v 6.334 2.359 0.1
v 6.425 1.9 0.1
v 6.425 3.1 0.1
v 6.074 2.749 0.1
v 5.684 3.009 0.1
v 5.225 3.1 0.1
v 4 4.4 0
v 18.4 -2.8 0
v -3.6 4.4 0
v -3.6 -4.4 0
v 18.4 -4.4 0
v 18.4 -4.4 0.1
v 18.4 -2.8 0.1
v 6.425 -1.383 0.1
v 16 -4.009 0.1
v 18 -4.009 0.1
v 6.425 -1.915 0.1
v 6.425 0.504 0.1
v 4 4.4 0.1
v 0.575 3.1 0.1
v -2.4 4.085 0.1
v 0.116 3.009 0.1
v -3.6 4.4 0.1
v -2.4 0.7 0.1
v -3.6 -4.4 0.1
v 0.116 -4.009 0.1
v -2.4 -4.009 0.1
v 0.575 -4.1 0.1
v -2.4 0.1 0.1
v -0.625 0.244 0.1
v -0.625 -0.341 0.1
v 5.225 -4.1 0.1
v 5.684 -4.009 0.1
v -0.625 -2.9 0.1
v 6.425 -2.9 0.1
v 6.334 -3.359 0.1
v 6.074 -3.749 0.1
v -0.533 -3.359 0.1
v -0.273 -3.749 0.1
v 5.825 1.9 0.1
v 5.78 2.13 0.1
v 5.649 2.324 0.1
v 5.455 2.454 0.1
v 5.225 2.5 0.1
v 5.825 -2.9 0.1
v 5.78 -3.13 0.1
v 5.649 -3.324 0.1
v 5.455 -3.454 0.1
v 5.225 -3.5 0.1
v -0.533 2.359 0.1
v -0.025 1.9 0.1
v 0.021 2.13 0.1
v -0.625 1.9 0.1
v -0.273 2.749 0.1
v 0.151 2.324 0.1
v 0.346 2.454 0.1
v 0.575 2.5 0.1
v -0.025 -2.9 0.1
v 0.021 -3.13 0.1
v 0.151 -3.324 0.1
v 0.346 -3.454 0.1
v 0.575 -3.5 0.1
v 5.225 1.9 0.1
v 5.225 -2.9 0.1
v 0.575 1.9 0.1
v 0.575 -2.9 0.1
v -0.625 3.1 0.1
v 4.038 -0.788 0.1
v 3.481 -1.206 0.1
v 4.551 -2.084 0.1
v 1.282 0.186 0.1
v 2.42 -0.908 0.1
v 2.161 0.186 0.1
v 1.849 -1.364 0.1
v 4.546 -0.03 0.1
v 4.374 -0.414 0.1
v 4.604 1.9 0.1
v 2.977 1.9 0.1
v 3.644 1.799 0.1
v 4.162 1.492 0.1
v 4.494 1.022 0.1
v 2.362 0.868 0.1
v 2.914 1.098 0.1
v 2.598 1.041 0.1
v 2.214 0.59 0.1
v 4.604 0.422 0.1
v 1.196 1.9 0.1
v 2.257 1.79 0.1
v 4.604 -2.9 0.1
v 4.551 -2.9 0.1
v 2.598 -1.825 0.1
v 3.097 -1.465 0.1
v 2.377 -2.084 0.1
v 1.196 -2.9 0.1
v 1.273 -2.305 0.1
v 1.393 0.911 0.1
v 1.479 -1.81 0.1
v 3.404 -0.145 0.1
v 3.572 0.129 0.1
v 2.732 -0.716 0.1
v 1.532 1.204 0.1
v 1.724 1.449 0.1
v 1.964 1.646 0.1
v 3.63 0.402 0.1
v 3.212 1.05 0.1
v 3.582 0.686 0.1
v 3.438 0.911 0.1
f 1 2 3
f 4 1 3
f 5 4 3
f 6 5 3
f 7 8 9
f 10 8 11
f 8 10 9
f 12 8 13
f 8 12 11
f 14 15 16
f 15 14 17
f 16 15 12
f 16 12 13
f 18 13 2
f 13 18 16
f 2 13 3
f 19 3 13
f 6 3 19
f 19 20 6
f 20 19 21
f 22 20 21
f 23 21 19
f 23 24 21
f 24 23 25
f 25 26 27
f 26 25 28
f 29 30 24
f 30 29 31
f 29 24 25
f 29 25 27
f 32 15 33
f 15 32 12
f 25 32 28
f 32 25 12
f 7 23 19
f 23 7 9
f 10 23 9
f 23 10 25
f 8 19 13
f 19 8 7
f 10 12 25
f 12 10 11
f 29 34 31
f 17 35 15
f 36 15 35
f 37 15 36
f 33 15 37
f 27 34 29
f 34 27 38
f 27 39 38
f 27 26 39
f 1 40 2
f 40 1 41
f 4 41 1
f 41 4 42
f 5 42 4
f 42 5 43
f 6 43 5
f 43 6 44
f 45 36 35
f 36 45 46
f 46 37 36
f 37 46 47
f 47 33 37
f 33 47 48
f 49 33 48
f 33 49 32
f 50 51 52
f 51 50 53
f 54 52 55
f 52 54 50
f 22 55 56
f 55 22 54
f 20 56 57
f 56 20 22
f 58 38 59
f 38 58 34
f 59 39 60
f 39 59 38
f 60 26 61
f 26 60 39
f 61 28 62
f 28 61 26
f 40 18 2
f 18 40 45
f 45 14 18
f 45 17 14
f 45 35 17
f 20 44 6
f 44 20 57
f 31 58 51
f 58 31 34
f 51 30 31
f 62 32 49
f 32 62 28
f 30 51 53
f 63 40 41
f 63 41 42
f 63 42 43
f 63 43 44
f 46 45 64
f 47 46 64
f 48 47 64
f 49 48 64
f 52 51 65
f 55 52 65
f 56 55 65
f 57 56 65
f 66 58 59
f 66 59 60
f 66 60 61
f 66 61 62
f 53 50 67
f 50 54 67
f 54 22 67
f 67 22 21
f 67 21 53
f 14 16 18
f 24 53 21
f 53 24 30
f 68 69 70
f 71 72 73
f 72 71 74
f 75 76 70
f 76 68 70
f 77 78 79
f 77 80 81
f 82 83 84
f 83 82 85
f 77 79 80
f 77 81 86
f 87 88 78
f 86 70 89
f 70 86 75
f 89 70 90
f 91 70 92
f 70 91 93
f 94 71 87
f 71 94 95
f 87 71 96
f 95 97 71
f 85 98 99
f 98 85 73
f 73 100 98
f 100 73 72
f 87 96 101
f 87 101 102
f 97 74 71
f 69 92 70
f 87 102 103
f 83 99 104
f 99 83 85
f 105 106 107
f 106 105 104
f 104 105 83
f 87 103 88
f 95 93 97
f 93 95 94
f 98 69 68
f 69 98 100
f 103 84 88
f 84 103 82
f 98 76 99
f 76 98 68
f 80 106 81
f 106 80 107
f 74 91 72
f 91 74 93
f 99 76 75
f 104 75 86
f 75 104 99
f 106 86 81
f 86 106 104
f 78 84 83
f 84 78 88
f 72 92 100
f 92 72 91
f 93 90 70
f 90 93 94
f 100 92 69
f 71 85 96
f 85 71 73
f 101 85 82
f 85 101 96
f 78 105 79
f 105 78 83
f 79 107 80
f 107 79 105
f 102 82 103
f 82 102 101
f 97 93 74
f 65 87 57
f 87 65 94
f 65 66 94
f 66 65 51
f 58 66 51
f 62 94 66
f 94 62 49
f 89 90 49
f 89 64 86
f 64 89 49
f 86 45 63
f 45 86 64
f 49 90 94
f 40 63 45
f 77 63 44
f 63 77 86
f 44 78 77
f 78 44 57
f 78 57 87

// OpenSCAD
// file: ../p/1-4ndis.scad
use <../lib.scad>
function ldraw_lib__1_4ndis() = [
// 0 Disc Negative 0.25
// 0 Name: 1-4ndis.dat
// 0 Author: James Jessiman
// 0 !LDRAW_ORG Primitive UPDATE 2012-01
// 0 !LICENSE Licensed under CC BY 2.0 and CC BY 4.0 : see CAreadme.txt
// 
// 0 BFC CERTIFY CCW
  [0,"BFC","CERTIFY"],
  [0,"BFC","CCW"],
// 
// 0 !HISTORY 2002-03-23 [sbliss] Added BFC Statement
// 0 !HISTORY 2002-04-25 [PTadmin] Official Update 2002-02
// 0 !HISTORY 2007-06-22 [PTadmin] Header formatted for Contributor Agreement
// 0 !HISTORY 2008-07-01 [PTadmin] Official Update 2008-01
// 0 !HISTORY 2012-02-16 [Philo] Changed to CCW
// 0 !HISTORY 2012-03-30 [PTadmin] Official Update 2012-01
// 
// 
// 3 16 0.9239 0 0.3827 1 0 0 1 0 1
  [3,16,0.9239,0,0.3827,1,0,0,1,0,1],
// 3 16 0.7071 0 0.7071 0.9239 0 0.3827 1 0 1
  [3,16,0.7071,0,0.7071,0.9239,0,0.3827,1,0,1],
// 3 16 0.3827 0 0.9239 0.7071 0 0.7071 1 0 1
  [3,16,0.3827,0,0.9239,0.7071,0,0.7071,1,0,1],
// 3 16 0 0 1 0.3827 0 0.9239 1 0 1
  [3,16,0,0,1,0.3827,0,0.9239,1,0,1],
];
module ldraw_lib__1_4ndis(step=0, col=false, unit=2/5, alt=false, line=0.2, solid=!$preview)
    makepoly(ldraw_lib__1_4ndis(), step=step, col=col, unit=unit, alt=alt, line=line, solid=solid);
ldraw_lib__1_4ndis(line=0.2);
// file: ../p/3-16ndis.scad
use <../lib.scad>
function ldraw_lib__3_16ndis() = [
// 0 Disc Negative 0.1875
// 0 Name: 3-16ndis.dat
// 0 Author: Guy Vivan [guyvivan]
// 0 !LDRAW_ORG Primitive UPDATE 2009-01
// 0 !LICENSE Licensed under CC BY 2.0 and CC BY 4.0 : see CAreadme.txt
// 
// 0 BFC CERTIFY CCW
  [0,"BFC","CERTIFY"],
  [0,"BFC","CCW"],
// 
// 0 !HISTORY 2009-05-02 [PTadmin] Official Update 2009-01
// 
// 
// 3 16 1 0 1 0.9239 0 0.3827 1 0 0
  [3,16,1,0,1,0.9239,0,0.3827,1,0,0],
// 3 16 1 0 1 0.7071 0 0.7071 0.9239 0 0.3827
  [3,16,1,0,1,0.7071,0,0.7071,0.9239,0,0.3827],
// 3 16 1 0 1 0.3827 0 0.9239 0.7071 0 0.7071
  [3,16,1,0,1,0.3827,0,0.9239,0.7071,0,0.7071],
// 
// 0 end of file
// 
];
module ldraw_lib__3_16ndis(step=0, col=false, unit=2/5, alt=false, line=0.2, solid=!$preview)
    makepoly(ldraw_lib__3_16ndis(), step=step, col=col, unit=unit, alt=alt, line=line, solid=solid);
ldraw_lib__3_16ndis(line=0.2);
// file: ../p/1-4ring1.scad
use <../lib.scad>
function ldraw_lib__1_4ring1() = [
// 0 Ring  1 x 0.25
// 0 Name: 1-4ring1.dat
// 0 Author: Chris Dee [cwdee]
// 0 !LDRAW_ORG Primitive UPDATE 2012-01
// 0 !LICENSE Licensed under CC BY 2.0 and CC BY 4.0 : see CAreadme.txt
// 
// 0 BFC CERTIFY CCW
  [0,"BFC","CERTIFY"],
  [0,"BFC","CCW"],
// 
// 0 !HISTORY 2000-05-07 [PTadmin] Official Update 2000-01
// 0 !HISTORY 2002-11-22 [hafhead] Added BFC statement
// 0 !HISTORY 2002-11-30 [PTadmin] Official Update 2002-05
// 0 !HISTORY 2007-06-22 [PTadmin] Header formatted for Contributor Agreement
// 0 !HISTORY 2008-07-01 [PTadmin] Official Update 2008-01
// 0 !HISTORY 2012-02-16 [Philo] Changed to CCW
// 0 !HISTORY 2012-03-30 [PTadmin] Official Update 2012-01
// 
// 
// 4 16 2 0 0 1.8478 0 0.7654 0.9239 0 0.3827 1 0 0
  [4,16,2,0,0,1.8478,0,0.7654,0.9239,0,0.3827,1,0,0],
// 4 16 1.8478 0 0.7654 1.4142 0 1.4142 0.7071 0 0.7071 0.9239 0 0.3827
  [4,16,1.8478,0,0.7654,1.4142,0,1.4142,0.7071,0,0.7071,0.9239,0,0.3827],
// 4 16 1.4142 0 1.4142 0.7654 0 1.8478 0.3827 0 0.9239 0.7071 0 0.7071
  [4,16,1.4142,0,1.4142,0.7654,0,1.8478,0.3827,0,0.9239,0.7071,0,0.7071],
// 4 16 0.7654 0 1.8478 0 0 2 0 0 1 0.3827 0 0.9239
  [4,16,0.7654,0,1.8478,0,0,2,0,0,1,0.3827,0,0.9239],
];
module ldraw_lib__1_4ring1(step=0, col=false, unit=2/5, alt=false, line=0.2, solid=!$preview)
    makepoly(ldraw_lib__1_4ring1(), step=step, col=col, unit=unit, alt=alt, line=line, solid=solid);
ldraw_lib__1_4ring1(line=0.2);
// file: ../p/1-4disc.scad
use <../lib.scad>
function ldraw_lib__1_4disc() = [
// 0 Disc 0.25
// 0 Name: 1-4disc.dat
// 0 Author: James Jessiman
// 0 !LDRAW_ORG Primitive UPDATE 2002-02
// 0 !LICENSE Licensed under CC BY 2.0 and CC BY 4.0 : see CAreadme.txt
// 
// 0 BFC CERTIFY CCW
  [0,"BFC","CERTIFY"],
  [0,"BFC","CCW"],
// 
// 0 !HISTORY 2002-03-23 [sbliss] Added BFC statement.
// 0 !HISTORY 2002-04-25 [PTadmin] Official Update 2002-02
// 0 !HISTORY 2007-06-22 [PTadmin] Header formatted for Contributor Agreement
// 0 !HISTORY 2008-07-01 [PTadmin] Official Update 2008-01
// 
// 
// 3 16 0 0 0 1 0 0 0.9239 0 0.3827
  [3,16,0,0,0,1,0,0,0.9239,0,0.3827],
// 3 16 0 0 0 0.9239 0 0.3827 0.7071 0 0.7071
  [3,16,0,0,0,0.9239,0,0.3827,0.7071,0,0.7071],
// 3 16 0 0 0 0.7071 0 0.7071 0.3827 0 0.9239
  [3,16,0,0,0,0.7071,0,0.7071,0.3827,0,0.9239],
// 3 16 0 0 0 0.3827 0 0.9239 0 0 1
  [3,16,0,0,0,0.3827,0,0.9239,0,0,1],
// 0
];
module ldraw_lib__1_4disc(step=0, col=false, unit=2/5, alt=false, line=0.2, solid=!$preview)
    makepoly(ldraw_lib__1_4disc(), step=step, col=col, unit=unit, alt=alt, line=line, solid=solid);
ldraw_lib__1_4disc(line=0.2);
// file: ../p/type-swiss721bt-bold-n2.scad
use <../lib.scad>
function ldraw_lib__type_swiss721bt_bold_n2() = [
// 0 Type Swiss721BT Number "2" Bold
// 0 Name: type-swiss721bt-bold-n2.dat
// 0 Author: Ulrich Röder [UR]
// 0 !LDRAW_ORG Primitive UPDATE 2019-01
// 0 !LICENSE Licensed under CC BY 2.0 and CC BY 4.0 : see CAreadme.txt
// 
// 0 BFC CERTIFY CCW
  [0,"BFC","CERTIFY"],
  [0,"BFC","CCW"],
// 
// 0 !HISTORY 2019-06-28 [PTadmin] Official Update 2019-01
// 
// 
// 0 // Main
// 3 16 .237 0 -.06 .121 0 -.147 .344 0 -.33
  [3,16,.237,0,-.06,.121,0,-.147,.344,0,-.33],
// 4 16 -.154 0 .143 -.337 0 .143 -.219 0 -.18 -.1 0 -.085
  [4,16,-.154,0,.143,-.337,0,.143,-.219,0,-.18,-.1,0,-.085],
// 3 16 .343 0 .098 .307 0 .018 .344 0 -.33
  [3,16,.343,0,.098,.307,0,.018,.344,0,-.33],
// 3 16 .307 0 .018 .237 0 -.06 .344 0 -.33
  [3,16,.307,0,.018,.237,0,-.06,.344,0,-.33],
// 3 16 .355 0 .5 .016 0 .5 .155 0 .479
  [3,16,.355,0,.5,.016,0,.5,.155,0,.479],
// 3 16 .355 0 .5 .263 0 .415 .332 0 .317
  [3,16,.355,0,.5,.263,0,.415,.332,0,.317],
// 4 16 -.112 0 .285 -.143 0 .227 .003 0 .333 -.063 0 .321
  [4,16,-.112,0,.285,-.143,0,.227,.003,0,.333,-.063,0,.321],
// 3 16 .355 0 .5 .155 0 .479 .263 0 .415
  [3,16,.355,0,.5,.155,0,.479,.263,0,.415],
// 3 16 .355 0 .5 .332 0 .317 .355 0 .192
  [3,16,.355,0,.5,.332,0,.317,.355,0,.192],
// 3 16 -.355 0 .5 -.134 0 .477 .016 0 .5
  [3,16,-.355,0,.5,-.134,0,.477,.016,0,.5],
// 4 16 .355 0 -.5 .355 0 .192 .343 0 .098 .344 0 -.33
  [4,16,.355,0,-.5,.355,0,.192,.343,0,.098,.344,0,-.33],
// 3 16 .355 0 -.5 .344 0 -.33 .344 0 -.5
  [3,16,.355,0,-.5,.344,0,-.33,.344,0,-.5],
// 4 16 -.109 0 -.33 .344 0 -.33 .041 0 -.201 -.063 0 -.276
  [4,16,-.109,0,-.33,.344,0,-.33,.041,0,-.201,-.063,0,-.276],
// 4 16 -.339 0 -.376 -.337 0 .143 -.355 0 .5 -.355 0 -.5
  [4,16,-.339,0,-.376,-.337,0,.143,-.355,0,.5,-.355,0,-.5],
// 3 16 -.355 0 .5 -.337 0 .143 -.314 0 .294
  [3,16,-.355,0,.5,-.337,0,.143,-.314,0,.294],
// 3 16 -.339 0 -.376 -.296 0 -.273 -.337 0 .143
  [3,16,-.339,0,-.376,-.296,0,-.273,-.337,0,.143],
// 4 16 .14 0 .131 -.143 0 .227 -.154 0 .143 .105 0 .074
  [4,16,.14,0,.131,-.143,0,.227,-.154,0,.143,.105,0,.074],
// 4 16 -.1 0 -.085 -.035 0 -.045 .105 0 .074 -.154 0 .143
  [4,16,-.1,0,-.085,-.035,0,-.045,.105,0,.074,-.154,0,.143],
// 3 16 -.355 0 .5 -.314 0 .294 -.285 0 .355
  [3,16,-.355,0,.5,-.314,0,.294,-.285,0,.355],
// 3 16 -.355 0 .5 -.285 0 .355 -.245 0 .406
  [3,16,-.355,0,.5,-.285,0,.355,-.245,0,.406],
// 3 16 -.296 0 -.273 -.219 0 -.18 -.337 0 .143
  [3,16,-.296,0,-.273,-.219,0,-.18,-.337,0,.143],
// 3 16 .121 0 -.147 .041 0 -.201 .344 0 -.33
  [3,16,.121,0,-.147,.041,0,-.201,.344,0,-.33],
// 3 16 -.355 0 .5 -.245 0 .406 -.195 0 .447
  [3,16,-.355,0,.5,-.245,0,.406,-.195,0,.447],
// 4 16 .152 0 .188 .003 0 .333 -.143 0 .227 .14 0 .131
  [4,16,.152,0,.188,.003,0,.333,-.143,0,.227,.14,0,.131],
// 4 16 .112 0 .294 .065 0 .323 .152 0 .188 .142 0 .247
  [4,16,.112,0,.294,.065,0,.323,.152,0,.188,.142,0,.247],
// 3 16 .152 0 .188 .065 0 .323 .003 0 .333
  [3,16,.152,0,.188,.065,0,.323,.003,0,.333],
// 3 16 -.355 0 .5 -.195 0 .447 -.134 0 .477
  [3,16,-.355,0,.5,-.195,0,.447,-.134,0,.477],
// 
// 0 // Black
// 4 0 -.296 0 -.273 -.339 0 -.376 -.355 0 -.5 -.109 0 -.33
  [4,0,-.296,0,-.273,-.339,0,-.376,-.355,0,-.5,-.109,0,-.33],
// 4 0 -.035 0 -.045 .121 0 -.147 .237 0 -.06 .105 0 .074
  [4,0,-.035,0,-.045,.121,0,-.147,.237,0,-.06,.105,0,.074],
// 4 0 -.134 0 .477 -.195 0 .447 -.112 0 .285 -.063 0 .321
  [4,0,-.134,0,.477,-.195,0,.447,-.112,0,.285,-.063,0,.321],
// 4 0 .237 0 -.06 .307 0 .018 .14 0 .131 .105 0 .074
  [4,0,.237,0,-.06,.307,0,.018,.14,0,.131,.105,0,.074],
// 4 0 .112 0 .294 .142 0 .247 .332 0 .317 .263 0 .415
  [4,0,.112,0,.294,.142,0,.247,.332,0,.317,.263,0,.415],
// 4 0 -.1 0 -.085 -.219 0 -.18 -.109 0 -.33 -.063 0 -.276
  [4,0,-.1,0,-.085,-.219,0,-.18,-.109,0,-.33,-.063,0,-.276],
// 3 0 .14 0 .131 .307 0 .018 .343 0 .098
  [3,0,.14,0,.131,.307,0,.018,.343,0,.098],
// 4 0 .14 0 .131 .343 0 .098 .355 0 .192 .152 0 .188
  [4,0,.14,0,.131,.343,0,.098,.355,0,.192,.152,0,.188],
// 4 0 .152 0 .188 .355 0 .192 .332 0 .317 .142 0 .247
  [4,0,.152,0,.188,.355,0,.192,.332,0,.317,.142,0,.247],
// 4 0 .003 0 .333 .016 0 .5 -.134 0 .477 -.063 0 .321
  [4,0,.003,0,.333,.016,0,.5,-.134,0,.477,-.063,0,.321],
// 4 0 -.035 0 -.045 -.1 0 -.085 -.063 0 -.276 .041 0 -.201
  [4,0,-.035,0,-.045,-.1,0,-.085,-.063,0,-.276,.041,0,-.201],
// 4 0 -.109 0 -.33 -.355 0 -.5 .344 0 -.5 .344 0 -.33
  [4,0,-.109,0,-.33,-.355,0,-.5,.344,0,-.5,.344,0,-.33],
// 3 0 -.035 0 -.045 .041 0 -.201 .121 0 -.147
  [3,0,-.035,0,-.045,.041,0,-.201,.121,0,-.147],
// 4 0 -.314 0 .294 -.337 0 .143 -.154 0 .143 -.143 0 .227
  [4,0,-.314,0,.294,-.337,0,.143,-.154,0,.143,-.143,0,.227],
// 4 0 -.112 0 .285 -.285 0 .355 -.314 0 .294 -.143 0 .227
  [4,0,-.112,0,.285,-.285,0,.355,-.314,0,.294,-.143,0,.227],
// 4 0 .003 0 .333 .065 0 .323 .155 0 .479 .016 0 .5
  [4,0,.003,0,.333,.065,0,.323,.155,0,.479,.016,0,.5],
// 4 0 .263 0 .415 .155 0 .479 .065 0 .323 .112 0 .294
  [4,0,.263,0,.415,.155,0,.479,.065,0,.323,.112,0,.294],
// 4 0 -.285 0 .355 -.112 0 .285 -.195 0 .447 -.245 0 .406
  [4,0,-.285,0,.355,-.112,0,.285,-.195,0,.447,-.245,0,.406],
// 3 0 -.296 0 -.273 -.109 0 -.33 -.219 0 -.18
  [3,0,-.296,0,-.273,-.109,0,-.33,-.219,0,-.18],
];
module ldraw_lib__type_swiss721bt_bold_n2(step=0, col=false, unit=2/5, alt=false, line=0.2, solid=!$preview)
    makepoly(ldraw_lib__type_swiss721bt_bold_n2(), step=step, col=col, unit=unit, alt=alt, line=line, solid=solid);
ldraw_lib__type_swiss721bt_bold_n2(line=0.2);
// file: s/821435as03.scad
use <../../lib.scad>
use <../../p/1-4ndis.scad>
function ldraw_lib__s__821435as03() = [
// 0 ~Sticker Sloped Body for Racing Number
// 0 Name: s\821435as03.dat
// 0 Author: Ulrich Röder [UR]
// 0 !LDRAW_ORG Subpart UPDATE 2019-01
// 0 !LICENSE Licensed under CC BY 2.0 and CC BY 4.0 : see CAreadme.txt
// 
// 0 BFC CERTIFY CCW
  [0,"BFC","CERTIFY"],
  [0,"BFC","CCW"],
// 
// 0 !HISTORY 2019-06-28 [PTadmin] Official Update 2019-01
// 
// 
// 0 // Main
// 1 16 13.063 -.25 4.75 3 0 0 0 1 0 0 0 3 1-4ndis.dat
  [1,16,13.063,-.25,4.75,3,0,0,0,1,0,0,0,3, ldraw_lib__1_4ndis()],
// 3 16 10 0 11 46 0 -7 -9 0 11
  [3,16,10,0,11,46,0,-7,-9,0,11],
// 4 16 -9 0 -11 -9 0 11 46 0 -7 46 0 -11
  [4,16,-9,0,-11,-9,0,11,46,0,-7,46,0,-11],
// 4 16 46 -.25 -11 46 0 -11 46 0 -7 46 -.25 -7
  [4,16,46,-.25,-11,46,0,-11,46,0,-7,46,-.25,-7],
// 4 16 16.063 -.25 -4.788 40 -.25 -10.022 45 -.25 -10.022 16.063 -.25 -3.458
  [4,16,16.063,-.25,-4.788,40,-.25,-10.022,45,-.25,-10.022,16.063,-.25,-3.458],
// 3 16 45 -.25 -10.022 40 -.25 -10.022 46 -.25 -11
  [3,16,45,-.25,-10.022,40,-.25,-10.022,46,-.25,-11],
// 3 16 45 -.25 -10.022 46 -.25 -11 46 -.25 -7
  [3,16,45,-.25,-10.022,46,-.25,-11,46,-.25,-7],
// 4 16 16.063 -.25 4.75 16.063 -.25 1.261 45 -.25 -10.022 46 -.25 -7
  [4,16,16.063,-.25,4.75,16.063,-.25,1.261,45,-.25,-10.022,46,-.25,-7],
// 3 16 16.063 -.25 4.75 46 -.25 -7 16.063 -.25 7.75
  [3,16,16.063,-.25,4.75,46,-.25,-7,16.063,-.25,7.75],
// 3 16 10 -.25 11 16.063 -.25 7.75 46 -.25 -7
  [3,16,10,-.25,11,16.063,-.25,7.75,46,-.25,-7],
// 3 16 13.063 -.25 7.75 16.063 -.25 7.75 10 -.25 11
  [3,16,13.063,-.25,7.75,16.063,-.25,7.75,10,-.25,11],
// 4 16 -6 -.25 10.213 1.438 -.25 7.75 13.063 -.25 7.75 10 -.25 11
  [4,16,-6,-.25,10.213,1.438,-.25,7.75,13.063,-.25,7.75,10,-.25,11],
// 3 16 .2899 -.25 7.5217 1.438 -.25 7.75 -6 -.25 10.213
  [3,16,.2899,-.25,7.5217,1.438,-.25,7.75,-6,-.25,10.213],
// 3 16 -9 -.25 11 -6 -.25 10.213 10 -.25 11
  [3,16,-9,-.25,11,-6,-.25,10.213,10,-.25,11],
// 4 16 -9 -.25 -11 -6 -.25 1.75 -6 -.25 10.213 -9 -.25 11
  [4,16,-9,-.25,-11,-6,-.25,1.75,-6,-.25,10.213,-9,-.25,11],
// 4 16 1.438 -.25 -10.25 .2899 -.25 -10.0217 -6 -.25 -10.022 -9 -.25 -11
  [4,16,1.438,-.25,-10.25,.2899,-.25,-10.0217,-6,-.25,-10.022,-9,-.25,-11],
// 4 16 -1.563 -.25 .61 -6 -.25 1.75 -6 -.25 .25 -1.563 -.25 -.853
  [4,16,-1.563,-.25,.61,-6,-.25,1.75,-6,-.25,.25,-1.563,-.25,-.853],
// 3 16 -6 -.25 .25 -6 -.25 1.75 -9 -.25 -11
  [3,16,-6,-.25,.25,-6,-.25,1.75,-9,-.25,-11],
// 3 16 -6 -.25 .25 -9 -.25 -11 -6 -.25 -10.022
  [3,16,-6,-.25,.25,-9,-.25,-11,-6,-.25,-10.022],
// 4 16 40 -.25 -10.022 14.2111 -.25 -10.0217 13.063 -.25 -10.25 46 -.25 -11
  [4,16,40,-.25,-10.022,14.2111,-.25,-10.0217,13.063,-.25,-10.25,46,-.25,-11],
// 4 16 1.438 -.25 -10.25 -9 -.25 -11 46 -.25 -11 13.063 -.25 -10.25
  [4,16,1.438,-.25,-10.25,-9,-.25,-11,46,-.25,-11,13.063,-.25,-10.25],
// 4 16 -9 -.25 11 10 -.25 11 10 0 11 -9 0 11
  [4,16,-9,-.25,11,10,-.25,11,10,0,11,-9,0,11],
// 4 16 -9 0 11 -9 0 -11 -9 -.25 -11 -9 -.25 11
  [4,16,-9,0,11,-9,0,-11,-9,-.25,-11,-9,-.25,11],
// 4 16 10 -.25 11 46 -.25 -7 46 0 -7 10 0 11
  [4,16,10,-.25,11,46,-.25,-7,46,0,-7,10,0,11],
// 4 16 46 0 -11 46 -.25 -11 -9 -.25 -11 -9 0 -11
  [4,16,46,0,-11,46,-.25,-11,-9,-.25,-11,-9,0,-11],
];
module ldraw_lib__s__821435as03(step=0, col=false, unit=2/5, alt=false, line=0.2, solid=!$preview)
    makepoly(ldraw_lib__s__821435as03(), step=step, col=col, unit=unit, alt=alt, line=line, solid=solid);
ldraw_lib__s__821435as03(line=0.2);
// file: s/821435as02.scad
use <../../lib.scad>
use <../../p/3-16ndis.scad>
function ldraw_lib__s__821435as02() = [
// 0 ~Sticker Upper Triangle with Cutout for Racing Number
// 0 Name: s\821435as02.dat
// 0 Author: Ulrich Röder [UR]
// 0 !LDRAW_ORG Subpart UPDATE 2019-01
// 0 !LICENSE Licensed under CC BY 2.0 and CC BY 4.0 : see CAreadme.txt
// 
// 0 BFC CERTIFY CCW
  [0,"BFC","CERTIFY"],
  [0,"BFC","CCW"],
// 
// 0 !HISTORY 2019-06-28 [PTadmin] Official Update 2019-01
// 
// 
// 0 // Main
// 1 16 1.438 -.25 4.75 -3 0 0 0 1 0 0 0 3 3-16ndis.dat
  [1,16,1.438,-.25,4.75,-3,0,0,0,1,0,0,0,3, ldraw_lib__3_16ndis()],
// 3 16 -1.562 -.25 7.75 .2899 -.25 7.5217 -6 -.25 10.213
  [3,16,-1.562,-.25,7.75,.2899,-.25,7.5217,-6,-.25,10.213],
// 3 16 -1.562 -.25 7.75 -6 -.25 10.213 -1.562 -.25 4.75
  [3,16,-1.562,-.25,7.75,-6,-.25,10.213,-1.562,-.25,4.75],
// 3 16 16.063 -.25 -3.458 45 -.25 -10.022 16.063 -.25 1.261
  [3,16,16.063,-.25,-3.458,45,-.25,-10.022,16.063,-.25,1.261],
// 4 16 -6 -.25 1.75 -1.563 -.25 .61 -1.562 -.25 4.75 -6 -.25 10.213
  [4,16,-6,-.25,1.75,-1.563,-.25,.61,-1.562,-.25,4.75,-6,-.25,10.213],
];
module ldraw_lib__s__821435as02(step=0, col=false, unit=2/5, alt=false, line=0.2, solid=!$preview)
    makepoly(ldraw_lib__s__821435as02(), step=step, col=col, unit=unit, alt=alt, line=line, solid=solid);
ldraw_lib__s__821435as02(line=0.2);
// file: s/821435as01.scad
use <../../lib.scad>
use <../../p/1-4disc.scad>
use <../../p/1-4ring1.scad>
function ldraw_lib__s__821435as01() = [
// 0 ~Sticker Lower Triangle and Racing Number Frame
// 0 Name: s\821435as01.dat
// 0 Author: Ulrich Röder [UR]
// 0 !LDRAW_ORG Subpart UPDATE 2019-01
// 0 !LICENSE Licensed under CC BY 2.0 and CC BY 4.0 : see CAreadme.txt
// 
// 0 BFC CERTIFY CCW
  [0,"BFC","CERTIFY"],
  [0,"BFC","CCW"],
// 
// 0 !HISTORY 2019-06-28 [PTadmin] Official Update 2019-01
// 
// 
// 0 // Main
// 
// 3 16 -6 -0.25 0.25 -1.562 -0.25 -7.25 -1.563 -0.25 -0.853
  [3,16,-6,-0.25,0.25,-1.562,-0.25,-7.25,-1.563,-0.25,-0.853],
// 3 16 16.063 -0.25 -4.788 16.063 -0.25 -7.25 40 -0.25 -10.022
  [3,16,16.063,-0.25,-4.788,16.063,-0.25,-7.25,40,-0.25,-10.022],
// 3 16 15.8347 -0.25 -8.3981 40 -0.25 -10.022 16.063 -0.25 -7.25
  [3,16,15.8347,-0.25,-8.3981,40,-0.25,-10.022,16.063,-0.25,-7.25],
// 3 16 15.1843 -0.25 -9.3713 40 -0.25 -10.022 15.8347 -0.25 -8.3981
  [3,16,15.1843,-0.25,-9.3713,40,-0.25,-10.022,15.8347,-0.25,-8.3981],
// 3 16 14.2111 -0.25 -10.0217 40 -0.25 -10.022 15.1843 -0.25 -9.3713
  [3,16,14.2111,-0.25,-10.0217,40,-0.25,-10.022,15.1843,-0.25,-9.3713],
// 4 16 -6 -0.25 0.25 -6 -0.25 -10.022 -1.3337 -0.25 -8.3981 -1.562 -0.25 -7.25
  [4,16,-6,-0.25,0.25,-6,-0.25,-10.022,-1.3337,-0.25,-8.3981,-1.562,-0.25,-7.25],
// 3 16 -6 -0.25 -10.022 -0.6833 -0.25 -9.3713 -1.3337 -0.25 -8.3981
  [3,16,-6,-0.25,-10.022,-0.6833,-0.25,-9.3713,-1.3337,-0.25,-8.3981],
// 3 16 -6 -0.25 -10.022 0.2899 -0.25 -10.0217 -0.6833 -0.25 -9.3713
  [3,16,-6,-0.25,-10.022,0.2899,-0.25,-10.0217,-0.6833,-0.25,-9.3713],
// 
// 0 // Black
// 1 0 13.063 -.25 4.75 1.5 0 0 0 1 0 0 0 1.5 1-4ring1.dat
  [1,0,13.063,-.25,4.75,1.5,0,0,0,1,0,0,0,1.5, ldraw_lib__1_4ring1()],
// 1 0 13.063 -.25 -7.25 1.5 0 0 0 1 0 0 0 -1.5 1-4ring1.dat
  [1,0,13.063,-.25,-7.25,1.5,0,0,0,1,0,0,0,-1.5, ldraw_lib__1_4ring1()],
// 1 0 1.438 -.25 4.75 -1.5 0 0 0 1 0 0 0 1.5 1-4ring1.dat
  [1,0,1.438,-.25,4.75,-1.5,0,0,0,1,0,0,0,1.5, ldraw_lib__1_4ring1()],
// 1 0 1.438 -.25 -7.25 -1.5 0 0 0 1 0 0 0 -1.5 1-4ring1.dat
  [1,0,1.438,-.25,-7.25,-1.5,0,0,0,1,0,0,0,-1.5, ldraw_lib__1_4ring1()],
// 4 0 14.563 -0.25 4.75 14.563 -0.25 -7.25 16.063 -0.25 1.261 16.063 -0.25 4.75
  [4,0,14.563,-0.25,4.75,14.563,-0.25,-7.25,16.063,-0.25,1.261,16.063,-0.25,4.75],
// 3 0 14.563 -0.25 -7.25 16.063 -0.25 -3.458 16.063 -0.25 1.261
  [3,0,14.563,-0.25,-7.25,16.063,-0.25,-3.458,16.063,-0.25,1.261],
// 3 0 14.563 -0.25 -7.25 16.063 -0.25 -4.788 16.063 -0.25 -3.458
  [3,0,14.563,-0.25,-7.25,16.063,-0.25,-4.788,16.063,-0.25,-3.458],
// 3 0 14.563 -0.25 -7.25 16.063 -0.25 -7.25 16.063 -0.25 -4.788
  [3,0,14.563,-0.25,-7.25,16.063,-0.25,-7.25,16.063,-0.25,-4.788],
// 4 0 13.063 -0.25 6.25 13.063 -0.25 7.75 1.438 -0.25 7.75 1.438 -0.25 6.25
  [4,0,13.063,-0.25,6.25,13.063,-0.25,7.75,1.438,-0.25,7.75,1.438,-0.25,6.25],
// 4 0 -0.062 -0.25 4.75 -1.563 -0.25 -0.853 -1.562 -0.25 -7.25 -0.062 -0.25 -7.25
  [4,0,-0.062,-0.25,4.75,-1.563,-0.25,-0.853,-1.562,-0.25,-7.25,-0.062,-0.25,-7.25],
// 3 0 -0.062 -0.25 4.75 -1.563 -0.25 0.61 -1.563 -0.25 -0.853
  [3,0,-0.062,-0.25,4.75,-1.563,-0.25,0.61,-1.563,-0.25,-0.853],
// 4 0 1.438 -0.25 -10.25 13.063 -0.25 -10.25 13.063 -0.25 -8.75 1.438 -0.25 -8.75
  [4,0,1.438,-0.25,-10.25,13.063,-0.25,-10.25,13.063,-0.25,-8.75,1.438,-0.25,-8.75],
// 3 0 -1.563 -0.25 0.61 -0.062 -0.25 4.75 -1.562 -0.25 4.75
  [3,0,-1.563,-0.25,0.61,-0.062,-0.25,4.75,-1.562,-0.25,4.75],
// 
// 0 // White
// 1 15 13.063 -.25 4.75 1.5 0 0 0 1 0 0 0 1.5 1-4disc.dat
  [1,15,13.063,-.25,4.75,1.5,0,0,0,1,0,0,0,1.5, ldraw_lib__1_4disc()],
// 1 15 13.063 -.25 -7.25 1.5 0 0 0 1 0 0 0 -1.5 1-4disc.dat
  [1,15,13.063,-.25,-7.25,1.5,0,0,0,1,0,0,0,-1.5, ldraw_lib__1_4disc()],
// 1 15 1.438 -.25 4.75 -1.5 0 0 0 1 0 0 0 1.5 1-4disc.dat
  [1,15,1.438,-.25,4.75,-1.5,0,0,0,1,0,0,0,1.5, ldraw_lib__1_4disc()],
// 1 15 1.438 -.25 -7.25 -1.5 0 0 0 1 0 0 0 -1.5 1-4disc.dat
  [1,15,1.438,-.25,-7.25,-1.5,0,0,0,1,0,0,0,-1.5, ldraw_lib__1_4disc()],
];
module ldraw_lib__s__821435as01(step=0, col=false, unit=2/5, alt=false, line=0.2, solid=!$preview)
    makepoly(ldraw_lib__s__821435as01(), step=step, col=col, unit=unit, alt=alt, line=line, solid=solid);
ldraw_lib__s__821435as01(line=0.2);
// file: 821435c.scad
use <../lib.scad>
use <s/821435as01.scad>
use <s/821435as02.scad>
use <s/821435as03.scad>
use <../p/type-swiss721bt-bold-n2.scad>
function ldraw_lib__821435c() = [
// 0 Sticker with White/Black Triangles and Racing Number "2", Right
// 0 Name: 821435c.dat
// 0 Author: Ulrich Röder [UR]
// 0 !LDRAW_ORG Part UPDATE 2019-01
// 0 !LICENSE Licensed under CC BY 2.0 and CC BY 4.0 : see CAreadme.txt
// 
// 0 BFC CERTIFY CCW
  [0,"BFC","CERTIFY"],
  [0,"BFC","CCW"],
// 
// 0 !KEYWORDS cup, Racers, Set 6539
// 
// 0 !HISTORY 2019-06-28 [PTadmin] Official Update 2019-01
// 
// 
// 0 // Main
// 
// 1 16 0 0 0 1 0 0 0 1 0 0 0 1 s\821435as03.dat
  [1,16,0,0,0,1,0,0,0,1,0,0,0,1, ldraw_lib__s__821435as03()],
// 
// 0 // Black
// 1 0 0 0 0 1 0 0 0 1 0 0 0 1 s\821435as01.dat
  [1,0,0,0,0,1,0,0,0,1,0,0,0,1, ldraw_lib__s__821435as01()],
// 
// 0 // White
// 1 15 0 0 0 1 0 0 0 1 0 0 0 1 s\821435as02.dat
  [1,15,0,0,0,1,0,0,0,1,0,0,0,1, ldraw_lib__s__821435as02()],
// 1 15 7.25 -.25 -1.25 12 0 0 0 1 0 0 0 12 type-swiss721bt-bold-n2.dat
  [1,15,7.25,-.25,-1.25,12,0,0,0,1,0,0,0,12, ldraw_lib__type_swiss721bt_bold_n2()],
// 4 15 2.99 -.25 -7.25 2.99 -.25 4.75 1.438 -.25 6.25 1.438 -.25 4.75
  [4,15,2.99,-.25,-7.25,2.99,-.25,4.75,1.438,-.25,6.25,1.438,-.25,4.75],
// 4 15 1.438 -.25 4.75 -.062 -.25 4.75 1.438 -.25 -7.25 2.99 -.25 -7.25
  [4,15,1.438,-.25,4.75,-.062,-.25,4.75,1.438,-.25,-7.25,2.99,-.25,-7.25],
// 3 15 -.062 -.25 -7.25 1.438 -.25 -7.25 -.062 -.25 4.75
  [3,15,-.062,-.25,-7.25,1.438,-.25,-7.25,-.062,-.25,4.75],
// 4 15 13.063 -.25 -8.75 2.99 -.25 -7.25 1.438 -.25 -7.25 1.438 -.25 -8.75
  [4,15,13.063,-.25,-8.75,2.99,-.25,-7.25,1.438,-.25,-7.25,1.438,-.25,-8.75],
// 3 15 11.51 -.25 -7.25 11.378 -.25 -7.25 13.063 -.25 -8.75
  [3,15,11.51,-.25,-7.25,11.378,-.25,-7.25,13.063,-.25,-8.75],
// 4 15 11.51 -.25 1.054 11.51 -.25 -7.25 13.063 -.25 -8.75 13.063 -.25 -7.25
  [4,15,11.51,-.25,1.054,11.51,-.25,-7.25,13.063,-.25,-8.75,13.063,-.25,-7.25],
// 4 15 13.063 -.25 4.75 11.51 -.25 1.054 13.063 -.25 -7.25 14.563 -.25 -7.25
  [4,15,13.063,-.25,4.75,11.51,-.25,1.054,13.063,-.25,-7.25,14.563,-.25,-7.25],
// 3 15 13.063 -.25 -8.75 11.378 -.25 -7.25 2.99 -.25 -7.25
  [3,15,13.063,-.25,-8.75,11.378,-.25,-7.25,2.99,-.25,-7.25],
// 3 15 14.563 -.25 4.75 13.063 -.25 4.75 14.563 -.25 -7.25
  [3,15,14.563,-.25,4.75,13.063,-.25,4.75,14.563,-.25,-7.25],
// 4 15 13.063 -.25 6.25 11.51 -.25 4.75 11.51 -.25 1.054 13.063 -.25 4.75
  [4,15,13.063,-.25,6.25,11.51,-.25,4.75,11.51,-.25,1.054,13.063,-.25,4.75],
// 4 15 1.438 -.25 6.25 7.442 -.25 4.75 11.51 -.25 4.75 13.063 -.25 6.25
  [4,15,1.438,-.25,6.25,7.442,-.25,4.75,11.51,-.25,4.75,13.063,-.25,6.25],
// 3 15 7.442 -.25 4.75 1.438 -.25 6.25 2.99 -.25 4.75
  [3,15,7.442,-.25,4.75,1.438,-.25,6.25,2.99,-.25,4.75],
];
module ldraw_lib__821435c(step=0, col=false, unit=2/5, alt=false, line=0.2, solid=!$preview)
    makepoly(ldraw_lib__821435c(), step=step, col=col, unit=unit, alt=alt, line=line, solid=solid);
ldraw_lib__821435c(line=0.2);
// main file
use <../lib.scad>
use <821435c.scad>
function ldraw_lib__169675g() = [
// 0 =Sticker with White/Black Triangles and Racing Number "2", Right
// 0 Name: 169675g.dat
// 0 Author: [PTadmin]
// 0 !LDRAW_ORG Part Alias UPDATE 2019-02
// 0 !LICENSE Licensed under CC BY 4.0 : see CAreadme.txt
// 
// 0 BFC CERTIFY CCW
  [0,"BFC","CERTIFY"],
  [0,"BFC","CCW"],
// 
// 0 !KEYWORDS Cargo, container, Set 4555
// 
// 0 !HISTORY 2019-09-09 [PTadmin] Official Update 2019-02
// 
// 
// 0 // Alias of 821435c
// 
// 1 16 0 0 0 1 0 0 0 1 0 0 0 1 821435c.dat
  [1,16,0,0,0,1,0,0,0,1,0,0,0,1, ldraw_lib__821435c()],
];
module ldraw_lib__169675g(step=0, col=false, unit=2/5, alt=false, line=0.2, solid=!$preview)
    makepoly(ldraw_lib__169675g(), step=step, col=col, unit=unit, alt=alt, line=line, solid=solid);
ldraw_lib__169675g(line=0.2);
